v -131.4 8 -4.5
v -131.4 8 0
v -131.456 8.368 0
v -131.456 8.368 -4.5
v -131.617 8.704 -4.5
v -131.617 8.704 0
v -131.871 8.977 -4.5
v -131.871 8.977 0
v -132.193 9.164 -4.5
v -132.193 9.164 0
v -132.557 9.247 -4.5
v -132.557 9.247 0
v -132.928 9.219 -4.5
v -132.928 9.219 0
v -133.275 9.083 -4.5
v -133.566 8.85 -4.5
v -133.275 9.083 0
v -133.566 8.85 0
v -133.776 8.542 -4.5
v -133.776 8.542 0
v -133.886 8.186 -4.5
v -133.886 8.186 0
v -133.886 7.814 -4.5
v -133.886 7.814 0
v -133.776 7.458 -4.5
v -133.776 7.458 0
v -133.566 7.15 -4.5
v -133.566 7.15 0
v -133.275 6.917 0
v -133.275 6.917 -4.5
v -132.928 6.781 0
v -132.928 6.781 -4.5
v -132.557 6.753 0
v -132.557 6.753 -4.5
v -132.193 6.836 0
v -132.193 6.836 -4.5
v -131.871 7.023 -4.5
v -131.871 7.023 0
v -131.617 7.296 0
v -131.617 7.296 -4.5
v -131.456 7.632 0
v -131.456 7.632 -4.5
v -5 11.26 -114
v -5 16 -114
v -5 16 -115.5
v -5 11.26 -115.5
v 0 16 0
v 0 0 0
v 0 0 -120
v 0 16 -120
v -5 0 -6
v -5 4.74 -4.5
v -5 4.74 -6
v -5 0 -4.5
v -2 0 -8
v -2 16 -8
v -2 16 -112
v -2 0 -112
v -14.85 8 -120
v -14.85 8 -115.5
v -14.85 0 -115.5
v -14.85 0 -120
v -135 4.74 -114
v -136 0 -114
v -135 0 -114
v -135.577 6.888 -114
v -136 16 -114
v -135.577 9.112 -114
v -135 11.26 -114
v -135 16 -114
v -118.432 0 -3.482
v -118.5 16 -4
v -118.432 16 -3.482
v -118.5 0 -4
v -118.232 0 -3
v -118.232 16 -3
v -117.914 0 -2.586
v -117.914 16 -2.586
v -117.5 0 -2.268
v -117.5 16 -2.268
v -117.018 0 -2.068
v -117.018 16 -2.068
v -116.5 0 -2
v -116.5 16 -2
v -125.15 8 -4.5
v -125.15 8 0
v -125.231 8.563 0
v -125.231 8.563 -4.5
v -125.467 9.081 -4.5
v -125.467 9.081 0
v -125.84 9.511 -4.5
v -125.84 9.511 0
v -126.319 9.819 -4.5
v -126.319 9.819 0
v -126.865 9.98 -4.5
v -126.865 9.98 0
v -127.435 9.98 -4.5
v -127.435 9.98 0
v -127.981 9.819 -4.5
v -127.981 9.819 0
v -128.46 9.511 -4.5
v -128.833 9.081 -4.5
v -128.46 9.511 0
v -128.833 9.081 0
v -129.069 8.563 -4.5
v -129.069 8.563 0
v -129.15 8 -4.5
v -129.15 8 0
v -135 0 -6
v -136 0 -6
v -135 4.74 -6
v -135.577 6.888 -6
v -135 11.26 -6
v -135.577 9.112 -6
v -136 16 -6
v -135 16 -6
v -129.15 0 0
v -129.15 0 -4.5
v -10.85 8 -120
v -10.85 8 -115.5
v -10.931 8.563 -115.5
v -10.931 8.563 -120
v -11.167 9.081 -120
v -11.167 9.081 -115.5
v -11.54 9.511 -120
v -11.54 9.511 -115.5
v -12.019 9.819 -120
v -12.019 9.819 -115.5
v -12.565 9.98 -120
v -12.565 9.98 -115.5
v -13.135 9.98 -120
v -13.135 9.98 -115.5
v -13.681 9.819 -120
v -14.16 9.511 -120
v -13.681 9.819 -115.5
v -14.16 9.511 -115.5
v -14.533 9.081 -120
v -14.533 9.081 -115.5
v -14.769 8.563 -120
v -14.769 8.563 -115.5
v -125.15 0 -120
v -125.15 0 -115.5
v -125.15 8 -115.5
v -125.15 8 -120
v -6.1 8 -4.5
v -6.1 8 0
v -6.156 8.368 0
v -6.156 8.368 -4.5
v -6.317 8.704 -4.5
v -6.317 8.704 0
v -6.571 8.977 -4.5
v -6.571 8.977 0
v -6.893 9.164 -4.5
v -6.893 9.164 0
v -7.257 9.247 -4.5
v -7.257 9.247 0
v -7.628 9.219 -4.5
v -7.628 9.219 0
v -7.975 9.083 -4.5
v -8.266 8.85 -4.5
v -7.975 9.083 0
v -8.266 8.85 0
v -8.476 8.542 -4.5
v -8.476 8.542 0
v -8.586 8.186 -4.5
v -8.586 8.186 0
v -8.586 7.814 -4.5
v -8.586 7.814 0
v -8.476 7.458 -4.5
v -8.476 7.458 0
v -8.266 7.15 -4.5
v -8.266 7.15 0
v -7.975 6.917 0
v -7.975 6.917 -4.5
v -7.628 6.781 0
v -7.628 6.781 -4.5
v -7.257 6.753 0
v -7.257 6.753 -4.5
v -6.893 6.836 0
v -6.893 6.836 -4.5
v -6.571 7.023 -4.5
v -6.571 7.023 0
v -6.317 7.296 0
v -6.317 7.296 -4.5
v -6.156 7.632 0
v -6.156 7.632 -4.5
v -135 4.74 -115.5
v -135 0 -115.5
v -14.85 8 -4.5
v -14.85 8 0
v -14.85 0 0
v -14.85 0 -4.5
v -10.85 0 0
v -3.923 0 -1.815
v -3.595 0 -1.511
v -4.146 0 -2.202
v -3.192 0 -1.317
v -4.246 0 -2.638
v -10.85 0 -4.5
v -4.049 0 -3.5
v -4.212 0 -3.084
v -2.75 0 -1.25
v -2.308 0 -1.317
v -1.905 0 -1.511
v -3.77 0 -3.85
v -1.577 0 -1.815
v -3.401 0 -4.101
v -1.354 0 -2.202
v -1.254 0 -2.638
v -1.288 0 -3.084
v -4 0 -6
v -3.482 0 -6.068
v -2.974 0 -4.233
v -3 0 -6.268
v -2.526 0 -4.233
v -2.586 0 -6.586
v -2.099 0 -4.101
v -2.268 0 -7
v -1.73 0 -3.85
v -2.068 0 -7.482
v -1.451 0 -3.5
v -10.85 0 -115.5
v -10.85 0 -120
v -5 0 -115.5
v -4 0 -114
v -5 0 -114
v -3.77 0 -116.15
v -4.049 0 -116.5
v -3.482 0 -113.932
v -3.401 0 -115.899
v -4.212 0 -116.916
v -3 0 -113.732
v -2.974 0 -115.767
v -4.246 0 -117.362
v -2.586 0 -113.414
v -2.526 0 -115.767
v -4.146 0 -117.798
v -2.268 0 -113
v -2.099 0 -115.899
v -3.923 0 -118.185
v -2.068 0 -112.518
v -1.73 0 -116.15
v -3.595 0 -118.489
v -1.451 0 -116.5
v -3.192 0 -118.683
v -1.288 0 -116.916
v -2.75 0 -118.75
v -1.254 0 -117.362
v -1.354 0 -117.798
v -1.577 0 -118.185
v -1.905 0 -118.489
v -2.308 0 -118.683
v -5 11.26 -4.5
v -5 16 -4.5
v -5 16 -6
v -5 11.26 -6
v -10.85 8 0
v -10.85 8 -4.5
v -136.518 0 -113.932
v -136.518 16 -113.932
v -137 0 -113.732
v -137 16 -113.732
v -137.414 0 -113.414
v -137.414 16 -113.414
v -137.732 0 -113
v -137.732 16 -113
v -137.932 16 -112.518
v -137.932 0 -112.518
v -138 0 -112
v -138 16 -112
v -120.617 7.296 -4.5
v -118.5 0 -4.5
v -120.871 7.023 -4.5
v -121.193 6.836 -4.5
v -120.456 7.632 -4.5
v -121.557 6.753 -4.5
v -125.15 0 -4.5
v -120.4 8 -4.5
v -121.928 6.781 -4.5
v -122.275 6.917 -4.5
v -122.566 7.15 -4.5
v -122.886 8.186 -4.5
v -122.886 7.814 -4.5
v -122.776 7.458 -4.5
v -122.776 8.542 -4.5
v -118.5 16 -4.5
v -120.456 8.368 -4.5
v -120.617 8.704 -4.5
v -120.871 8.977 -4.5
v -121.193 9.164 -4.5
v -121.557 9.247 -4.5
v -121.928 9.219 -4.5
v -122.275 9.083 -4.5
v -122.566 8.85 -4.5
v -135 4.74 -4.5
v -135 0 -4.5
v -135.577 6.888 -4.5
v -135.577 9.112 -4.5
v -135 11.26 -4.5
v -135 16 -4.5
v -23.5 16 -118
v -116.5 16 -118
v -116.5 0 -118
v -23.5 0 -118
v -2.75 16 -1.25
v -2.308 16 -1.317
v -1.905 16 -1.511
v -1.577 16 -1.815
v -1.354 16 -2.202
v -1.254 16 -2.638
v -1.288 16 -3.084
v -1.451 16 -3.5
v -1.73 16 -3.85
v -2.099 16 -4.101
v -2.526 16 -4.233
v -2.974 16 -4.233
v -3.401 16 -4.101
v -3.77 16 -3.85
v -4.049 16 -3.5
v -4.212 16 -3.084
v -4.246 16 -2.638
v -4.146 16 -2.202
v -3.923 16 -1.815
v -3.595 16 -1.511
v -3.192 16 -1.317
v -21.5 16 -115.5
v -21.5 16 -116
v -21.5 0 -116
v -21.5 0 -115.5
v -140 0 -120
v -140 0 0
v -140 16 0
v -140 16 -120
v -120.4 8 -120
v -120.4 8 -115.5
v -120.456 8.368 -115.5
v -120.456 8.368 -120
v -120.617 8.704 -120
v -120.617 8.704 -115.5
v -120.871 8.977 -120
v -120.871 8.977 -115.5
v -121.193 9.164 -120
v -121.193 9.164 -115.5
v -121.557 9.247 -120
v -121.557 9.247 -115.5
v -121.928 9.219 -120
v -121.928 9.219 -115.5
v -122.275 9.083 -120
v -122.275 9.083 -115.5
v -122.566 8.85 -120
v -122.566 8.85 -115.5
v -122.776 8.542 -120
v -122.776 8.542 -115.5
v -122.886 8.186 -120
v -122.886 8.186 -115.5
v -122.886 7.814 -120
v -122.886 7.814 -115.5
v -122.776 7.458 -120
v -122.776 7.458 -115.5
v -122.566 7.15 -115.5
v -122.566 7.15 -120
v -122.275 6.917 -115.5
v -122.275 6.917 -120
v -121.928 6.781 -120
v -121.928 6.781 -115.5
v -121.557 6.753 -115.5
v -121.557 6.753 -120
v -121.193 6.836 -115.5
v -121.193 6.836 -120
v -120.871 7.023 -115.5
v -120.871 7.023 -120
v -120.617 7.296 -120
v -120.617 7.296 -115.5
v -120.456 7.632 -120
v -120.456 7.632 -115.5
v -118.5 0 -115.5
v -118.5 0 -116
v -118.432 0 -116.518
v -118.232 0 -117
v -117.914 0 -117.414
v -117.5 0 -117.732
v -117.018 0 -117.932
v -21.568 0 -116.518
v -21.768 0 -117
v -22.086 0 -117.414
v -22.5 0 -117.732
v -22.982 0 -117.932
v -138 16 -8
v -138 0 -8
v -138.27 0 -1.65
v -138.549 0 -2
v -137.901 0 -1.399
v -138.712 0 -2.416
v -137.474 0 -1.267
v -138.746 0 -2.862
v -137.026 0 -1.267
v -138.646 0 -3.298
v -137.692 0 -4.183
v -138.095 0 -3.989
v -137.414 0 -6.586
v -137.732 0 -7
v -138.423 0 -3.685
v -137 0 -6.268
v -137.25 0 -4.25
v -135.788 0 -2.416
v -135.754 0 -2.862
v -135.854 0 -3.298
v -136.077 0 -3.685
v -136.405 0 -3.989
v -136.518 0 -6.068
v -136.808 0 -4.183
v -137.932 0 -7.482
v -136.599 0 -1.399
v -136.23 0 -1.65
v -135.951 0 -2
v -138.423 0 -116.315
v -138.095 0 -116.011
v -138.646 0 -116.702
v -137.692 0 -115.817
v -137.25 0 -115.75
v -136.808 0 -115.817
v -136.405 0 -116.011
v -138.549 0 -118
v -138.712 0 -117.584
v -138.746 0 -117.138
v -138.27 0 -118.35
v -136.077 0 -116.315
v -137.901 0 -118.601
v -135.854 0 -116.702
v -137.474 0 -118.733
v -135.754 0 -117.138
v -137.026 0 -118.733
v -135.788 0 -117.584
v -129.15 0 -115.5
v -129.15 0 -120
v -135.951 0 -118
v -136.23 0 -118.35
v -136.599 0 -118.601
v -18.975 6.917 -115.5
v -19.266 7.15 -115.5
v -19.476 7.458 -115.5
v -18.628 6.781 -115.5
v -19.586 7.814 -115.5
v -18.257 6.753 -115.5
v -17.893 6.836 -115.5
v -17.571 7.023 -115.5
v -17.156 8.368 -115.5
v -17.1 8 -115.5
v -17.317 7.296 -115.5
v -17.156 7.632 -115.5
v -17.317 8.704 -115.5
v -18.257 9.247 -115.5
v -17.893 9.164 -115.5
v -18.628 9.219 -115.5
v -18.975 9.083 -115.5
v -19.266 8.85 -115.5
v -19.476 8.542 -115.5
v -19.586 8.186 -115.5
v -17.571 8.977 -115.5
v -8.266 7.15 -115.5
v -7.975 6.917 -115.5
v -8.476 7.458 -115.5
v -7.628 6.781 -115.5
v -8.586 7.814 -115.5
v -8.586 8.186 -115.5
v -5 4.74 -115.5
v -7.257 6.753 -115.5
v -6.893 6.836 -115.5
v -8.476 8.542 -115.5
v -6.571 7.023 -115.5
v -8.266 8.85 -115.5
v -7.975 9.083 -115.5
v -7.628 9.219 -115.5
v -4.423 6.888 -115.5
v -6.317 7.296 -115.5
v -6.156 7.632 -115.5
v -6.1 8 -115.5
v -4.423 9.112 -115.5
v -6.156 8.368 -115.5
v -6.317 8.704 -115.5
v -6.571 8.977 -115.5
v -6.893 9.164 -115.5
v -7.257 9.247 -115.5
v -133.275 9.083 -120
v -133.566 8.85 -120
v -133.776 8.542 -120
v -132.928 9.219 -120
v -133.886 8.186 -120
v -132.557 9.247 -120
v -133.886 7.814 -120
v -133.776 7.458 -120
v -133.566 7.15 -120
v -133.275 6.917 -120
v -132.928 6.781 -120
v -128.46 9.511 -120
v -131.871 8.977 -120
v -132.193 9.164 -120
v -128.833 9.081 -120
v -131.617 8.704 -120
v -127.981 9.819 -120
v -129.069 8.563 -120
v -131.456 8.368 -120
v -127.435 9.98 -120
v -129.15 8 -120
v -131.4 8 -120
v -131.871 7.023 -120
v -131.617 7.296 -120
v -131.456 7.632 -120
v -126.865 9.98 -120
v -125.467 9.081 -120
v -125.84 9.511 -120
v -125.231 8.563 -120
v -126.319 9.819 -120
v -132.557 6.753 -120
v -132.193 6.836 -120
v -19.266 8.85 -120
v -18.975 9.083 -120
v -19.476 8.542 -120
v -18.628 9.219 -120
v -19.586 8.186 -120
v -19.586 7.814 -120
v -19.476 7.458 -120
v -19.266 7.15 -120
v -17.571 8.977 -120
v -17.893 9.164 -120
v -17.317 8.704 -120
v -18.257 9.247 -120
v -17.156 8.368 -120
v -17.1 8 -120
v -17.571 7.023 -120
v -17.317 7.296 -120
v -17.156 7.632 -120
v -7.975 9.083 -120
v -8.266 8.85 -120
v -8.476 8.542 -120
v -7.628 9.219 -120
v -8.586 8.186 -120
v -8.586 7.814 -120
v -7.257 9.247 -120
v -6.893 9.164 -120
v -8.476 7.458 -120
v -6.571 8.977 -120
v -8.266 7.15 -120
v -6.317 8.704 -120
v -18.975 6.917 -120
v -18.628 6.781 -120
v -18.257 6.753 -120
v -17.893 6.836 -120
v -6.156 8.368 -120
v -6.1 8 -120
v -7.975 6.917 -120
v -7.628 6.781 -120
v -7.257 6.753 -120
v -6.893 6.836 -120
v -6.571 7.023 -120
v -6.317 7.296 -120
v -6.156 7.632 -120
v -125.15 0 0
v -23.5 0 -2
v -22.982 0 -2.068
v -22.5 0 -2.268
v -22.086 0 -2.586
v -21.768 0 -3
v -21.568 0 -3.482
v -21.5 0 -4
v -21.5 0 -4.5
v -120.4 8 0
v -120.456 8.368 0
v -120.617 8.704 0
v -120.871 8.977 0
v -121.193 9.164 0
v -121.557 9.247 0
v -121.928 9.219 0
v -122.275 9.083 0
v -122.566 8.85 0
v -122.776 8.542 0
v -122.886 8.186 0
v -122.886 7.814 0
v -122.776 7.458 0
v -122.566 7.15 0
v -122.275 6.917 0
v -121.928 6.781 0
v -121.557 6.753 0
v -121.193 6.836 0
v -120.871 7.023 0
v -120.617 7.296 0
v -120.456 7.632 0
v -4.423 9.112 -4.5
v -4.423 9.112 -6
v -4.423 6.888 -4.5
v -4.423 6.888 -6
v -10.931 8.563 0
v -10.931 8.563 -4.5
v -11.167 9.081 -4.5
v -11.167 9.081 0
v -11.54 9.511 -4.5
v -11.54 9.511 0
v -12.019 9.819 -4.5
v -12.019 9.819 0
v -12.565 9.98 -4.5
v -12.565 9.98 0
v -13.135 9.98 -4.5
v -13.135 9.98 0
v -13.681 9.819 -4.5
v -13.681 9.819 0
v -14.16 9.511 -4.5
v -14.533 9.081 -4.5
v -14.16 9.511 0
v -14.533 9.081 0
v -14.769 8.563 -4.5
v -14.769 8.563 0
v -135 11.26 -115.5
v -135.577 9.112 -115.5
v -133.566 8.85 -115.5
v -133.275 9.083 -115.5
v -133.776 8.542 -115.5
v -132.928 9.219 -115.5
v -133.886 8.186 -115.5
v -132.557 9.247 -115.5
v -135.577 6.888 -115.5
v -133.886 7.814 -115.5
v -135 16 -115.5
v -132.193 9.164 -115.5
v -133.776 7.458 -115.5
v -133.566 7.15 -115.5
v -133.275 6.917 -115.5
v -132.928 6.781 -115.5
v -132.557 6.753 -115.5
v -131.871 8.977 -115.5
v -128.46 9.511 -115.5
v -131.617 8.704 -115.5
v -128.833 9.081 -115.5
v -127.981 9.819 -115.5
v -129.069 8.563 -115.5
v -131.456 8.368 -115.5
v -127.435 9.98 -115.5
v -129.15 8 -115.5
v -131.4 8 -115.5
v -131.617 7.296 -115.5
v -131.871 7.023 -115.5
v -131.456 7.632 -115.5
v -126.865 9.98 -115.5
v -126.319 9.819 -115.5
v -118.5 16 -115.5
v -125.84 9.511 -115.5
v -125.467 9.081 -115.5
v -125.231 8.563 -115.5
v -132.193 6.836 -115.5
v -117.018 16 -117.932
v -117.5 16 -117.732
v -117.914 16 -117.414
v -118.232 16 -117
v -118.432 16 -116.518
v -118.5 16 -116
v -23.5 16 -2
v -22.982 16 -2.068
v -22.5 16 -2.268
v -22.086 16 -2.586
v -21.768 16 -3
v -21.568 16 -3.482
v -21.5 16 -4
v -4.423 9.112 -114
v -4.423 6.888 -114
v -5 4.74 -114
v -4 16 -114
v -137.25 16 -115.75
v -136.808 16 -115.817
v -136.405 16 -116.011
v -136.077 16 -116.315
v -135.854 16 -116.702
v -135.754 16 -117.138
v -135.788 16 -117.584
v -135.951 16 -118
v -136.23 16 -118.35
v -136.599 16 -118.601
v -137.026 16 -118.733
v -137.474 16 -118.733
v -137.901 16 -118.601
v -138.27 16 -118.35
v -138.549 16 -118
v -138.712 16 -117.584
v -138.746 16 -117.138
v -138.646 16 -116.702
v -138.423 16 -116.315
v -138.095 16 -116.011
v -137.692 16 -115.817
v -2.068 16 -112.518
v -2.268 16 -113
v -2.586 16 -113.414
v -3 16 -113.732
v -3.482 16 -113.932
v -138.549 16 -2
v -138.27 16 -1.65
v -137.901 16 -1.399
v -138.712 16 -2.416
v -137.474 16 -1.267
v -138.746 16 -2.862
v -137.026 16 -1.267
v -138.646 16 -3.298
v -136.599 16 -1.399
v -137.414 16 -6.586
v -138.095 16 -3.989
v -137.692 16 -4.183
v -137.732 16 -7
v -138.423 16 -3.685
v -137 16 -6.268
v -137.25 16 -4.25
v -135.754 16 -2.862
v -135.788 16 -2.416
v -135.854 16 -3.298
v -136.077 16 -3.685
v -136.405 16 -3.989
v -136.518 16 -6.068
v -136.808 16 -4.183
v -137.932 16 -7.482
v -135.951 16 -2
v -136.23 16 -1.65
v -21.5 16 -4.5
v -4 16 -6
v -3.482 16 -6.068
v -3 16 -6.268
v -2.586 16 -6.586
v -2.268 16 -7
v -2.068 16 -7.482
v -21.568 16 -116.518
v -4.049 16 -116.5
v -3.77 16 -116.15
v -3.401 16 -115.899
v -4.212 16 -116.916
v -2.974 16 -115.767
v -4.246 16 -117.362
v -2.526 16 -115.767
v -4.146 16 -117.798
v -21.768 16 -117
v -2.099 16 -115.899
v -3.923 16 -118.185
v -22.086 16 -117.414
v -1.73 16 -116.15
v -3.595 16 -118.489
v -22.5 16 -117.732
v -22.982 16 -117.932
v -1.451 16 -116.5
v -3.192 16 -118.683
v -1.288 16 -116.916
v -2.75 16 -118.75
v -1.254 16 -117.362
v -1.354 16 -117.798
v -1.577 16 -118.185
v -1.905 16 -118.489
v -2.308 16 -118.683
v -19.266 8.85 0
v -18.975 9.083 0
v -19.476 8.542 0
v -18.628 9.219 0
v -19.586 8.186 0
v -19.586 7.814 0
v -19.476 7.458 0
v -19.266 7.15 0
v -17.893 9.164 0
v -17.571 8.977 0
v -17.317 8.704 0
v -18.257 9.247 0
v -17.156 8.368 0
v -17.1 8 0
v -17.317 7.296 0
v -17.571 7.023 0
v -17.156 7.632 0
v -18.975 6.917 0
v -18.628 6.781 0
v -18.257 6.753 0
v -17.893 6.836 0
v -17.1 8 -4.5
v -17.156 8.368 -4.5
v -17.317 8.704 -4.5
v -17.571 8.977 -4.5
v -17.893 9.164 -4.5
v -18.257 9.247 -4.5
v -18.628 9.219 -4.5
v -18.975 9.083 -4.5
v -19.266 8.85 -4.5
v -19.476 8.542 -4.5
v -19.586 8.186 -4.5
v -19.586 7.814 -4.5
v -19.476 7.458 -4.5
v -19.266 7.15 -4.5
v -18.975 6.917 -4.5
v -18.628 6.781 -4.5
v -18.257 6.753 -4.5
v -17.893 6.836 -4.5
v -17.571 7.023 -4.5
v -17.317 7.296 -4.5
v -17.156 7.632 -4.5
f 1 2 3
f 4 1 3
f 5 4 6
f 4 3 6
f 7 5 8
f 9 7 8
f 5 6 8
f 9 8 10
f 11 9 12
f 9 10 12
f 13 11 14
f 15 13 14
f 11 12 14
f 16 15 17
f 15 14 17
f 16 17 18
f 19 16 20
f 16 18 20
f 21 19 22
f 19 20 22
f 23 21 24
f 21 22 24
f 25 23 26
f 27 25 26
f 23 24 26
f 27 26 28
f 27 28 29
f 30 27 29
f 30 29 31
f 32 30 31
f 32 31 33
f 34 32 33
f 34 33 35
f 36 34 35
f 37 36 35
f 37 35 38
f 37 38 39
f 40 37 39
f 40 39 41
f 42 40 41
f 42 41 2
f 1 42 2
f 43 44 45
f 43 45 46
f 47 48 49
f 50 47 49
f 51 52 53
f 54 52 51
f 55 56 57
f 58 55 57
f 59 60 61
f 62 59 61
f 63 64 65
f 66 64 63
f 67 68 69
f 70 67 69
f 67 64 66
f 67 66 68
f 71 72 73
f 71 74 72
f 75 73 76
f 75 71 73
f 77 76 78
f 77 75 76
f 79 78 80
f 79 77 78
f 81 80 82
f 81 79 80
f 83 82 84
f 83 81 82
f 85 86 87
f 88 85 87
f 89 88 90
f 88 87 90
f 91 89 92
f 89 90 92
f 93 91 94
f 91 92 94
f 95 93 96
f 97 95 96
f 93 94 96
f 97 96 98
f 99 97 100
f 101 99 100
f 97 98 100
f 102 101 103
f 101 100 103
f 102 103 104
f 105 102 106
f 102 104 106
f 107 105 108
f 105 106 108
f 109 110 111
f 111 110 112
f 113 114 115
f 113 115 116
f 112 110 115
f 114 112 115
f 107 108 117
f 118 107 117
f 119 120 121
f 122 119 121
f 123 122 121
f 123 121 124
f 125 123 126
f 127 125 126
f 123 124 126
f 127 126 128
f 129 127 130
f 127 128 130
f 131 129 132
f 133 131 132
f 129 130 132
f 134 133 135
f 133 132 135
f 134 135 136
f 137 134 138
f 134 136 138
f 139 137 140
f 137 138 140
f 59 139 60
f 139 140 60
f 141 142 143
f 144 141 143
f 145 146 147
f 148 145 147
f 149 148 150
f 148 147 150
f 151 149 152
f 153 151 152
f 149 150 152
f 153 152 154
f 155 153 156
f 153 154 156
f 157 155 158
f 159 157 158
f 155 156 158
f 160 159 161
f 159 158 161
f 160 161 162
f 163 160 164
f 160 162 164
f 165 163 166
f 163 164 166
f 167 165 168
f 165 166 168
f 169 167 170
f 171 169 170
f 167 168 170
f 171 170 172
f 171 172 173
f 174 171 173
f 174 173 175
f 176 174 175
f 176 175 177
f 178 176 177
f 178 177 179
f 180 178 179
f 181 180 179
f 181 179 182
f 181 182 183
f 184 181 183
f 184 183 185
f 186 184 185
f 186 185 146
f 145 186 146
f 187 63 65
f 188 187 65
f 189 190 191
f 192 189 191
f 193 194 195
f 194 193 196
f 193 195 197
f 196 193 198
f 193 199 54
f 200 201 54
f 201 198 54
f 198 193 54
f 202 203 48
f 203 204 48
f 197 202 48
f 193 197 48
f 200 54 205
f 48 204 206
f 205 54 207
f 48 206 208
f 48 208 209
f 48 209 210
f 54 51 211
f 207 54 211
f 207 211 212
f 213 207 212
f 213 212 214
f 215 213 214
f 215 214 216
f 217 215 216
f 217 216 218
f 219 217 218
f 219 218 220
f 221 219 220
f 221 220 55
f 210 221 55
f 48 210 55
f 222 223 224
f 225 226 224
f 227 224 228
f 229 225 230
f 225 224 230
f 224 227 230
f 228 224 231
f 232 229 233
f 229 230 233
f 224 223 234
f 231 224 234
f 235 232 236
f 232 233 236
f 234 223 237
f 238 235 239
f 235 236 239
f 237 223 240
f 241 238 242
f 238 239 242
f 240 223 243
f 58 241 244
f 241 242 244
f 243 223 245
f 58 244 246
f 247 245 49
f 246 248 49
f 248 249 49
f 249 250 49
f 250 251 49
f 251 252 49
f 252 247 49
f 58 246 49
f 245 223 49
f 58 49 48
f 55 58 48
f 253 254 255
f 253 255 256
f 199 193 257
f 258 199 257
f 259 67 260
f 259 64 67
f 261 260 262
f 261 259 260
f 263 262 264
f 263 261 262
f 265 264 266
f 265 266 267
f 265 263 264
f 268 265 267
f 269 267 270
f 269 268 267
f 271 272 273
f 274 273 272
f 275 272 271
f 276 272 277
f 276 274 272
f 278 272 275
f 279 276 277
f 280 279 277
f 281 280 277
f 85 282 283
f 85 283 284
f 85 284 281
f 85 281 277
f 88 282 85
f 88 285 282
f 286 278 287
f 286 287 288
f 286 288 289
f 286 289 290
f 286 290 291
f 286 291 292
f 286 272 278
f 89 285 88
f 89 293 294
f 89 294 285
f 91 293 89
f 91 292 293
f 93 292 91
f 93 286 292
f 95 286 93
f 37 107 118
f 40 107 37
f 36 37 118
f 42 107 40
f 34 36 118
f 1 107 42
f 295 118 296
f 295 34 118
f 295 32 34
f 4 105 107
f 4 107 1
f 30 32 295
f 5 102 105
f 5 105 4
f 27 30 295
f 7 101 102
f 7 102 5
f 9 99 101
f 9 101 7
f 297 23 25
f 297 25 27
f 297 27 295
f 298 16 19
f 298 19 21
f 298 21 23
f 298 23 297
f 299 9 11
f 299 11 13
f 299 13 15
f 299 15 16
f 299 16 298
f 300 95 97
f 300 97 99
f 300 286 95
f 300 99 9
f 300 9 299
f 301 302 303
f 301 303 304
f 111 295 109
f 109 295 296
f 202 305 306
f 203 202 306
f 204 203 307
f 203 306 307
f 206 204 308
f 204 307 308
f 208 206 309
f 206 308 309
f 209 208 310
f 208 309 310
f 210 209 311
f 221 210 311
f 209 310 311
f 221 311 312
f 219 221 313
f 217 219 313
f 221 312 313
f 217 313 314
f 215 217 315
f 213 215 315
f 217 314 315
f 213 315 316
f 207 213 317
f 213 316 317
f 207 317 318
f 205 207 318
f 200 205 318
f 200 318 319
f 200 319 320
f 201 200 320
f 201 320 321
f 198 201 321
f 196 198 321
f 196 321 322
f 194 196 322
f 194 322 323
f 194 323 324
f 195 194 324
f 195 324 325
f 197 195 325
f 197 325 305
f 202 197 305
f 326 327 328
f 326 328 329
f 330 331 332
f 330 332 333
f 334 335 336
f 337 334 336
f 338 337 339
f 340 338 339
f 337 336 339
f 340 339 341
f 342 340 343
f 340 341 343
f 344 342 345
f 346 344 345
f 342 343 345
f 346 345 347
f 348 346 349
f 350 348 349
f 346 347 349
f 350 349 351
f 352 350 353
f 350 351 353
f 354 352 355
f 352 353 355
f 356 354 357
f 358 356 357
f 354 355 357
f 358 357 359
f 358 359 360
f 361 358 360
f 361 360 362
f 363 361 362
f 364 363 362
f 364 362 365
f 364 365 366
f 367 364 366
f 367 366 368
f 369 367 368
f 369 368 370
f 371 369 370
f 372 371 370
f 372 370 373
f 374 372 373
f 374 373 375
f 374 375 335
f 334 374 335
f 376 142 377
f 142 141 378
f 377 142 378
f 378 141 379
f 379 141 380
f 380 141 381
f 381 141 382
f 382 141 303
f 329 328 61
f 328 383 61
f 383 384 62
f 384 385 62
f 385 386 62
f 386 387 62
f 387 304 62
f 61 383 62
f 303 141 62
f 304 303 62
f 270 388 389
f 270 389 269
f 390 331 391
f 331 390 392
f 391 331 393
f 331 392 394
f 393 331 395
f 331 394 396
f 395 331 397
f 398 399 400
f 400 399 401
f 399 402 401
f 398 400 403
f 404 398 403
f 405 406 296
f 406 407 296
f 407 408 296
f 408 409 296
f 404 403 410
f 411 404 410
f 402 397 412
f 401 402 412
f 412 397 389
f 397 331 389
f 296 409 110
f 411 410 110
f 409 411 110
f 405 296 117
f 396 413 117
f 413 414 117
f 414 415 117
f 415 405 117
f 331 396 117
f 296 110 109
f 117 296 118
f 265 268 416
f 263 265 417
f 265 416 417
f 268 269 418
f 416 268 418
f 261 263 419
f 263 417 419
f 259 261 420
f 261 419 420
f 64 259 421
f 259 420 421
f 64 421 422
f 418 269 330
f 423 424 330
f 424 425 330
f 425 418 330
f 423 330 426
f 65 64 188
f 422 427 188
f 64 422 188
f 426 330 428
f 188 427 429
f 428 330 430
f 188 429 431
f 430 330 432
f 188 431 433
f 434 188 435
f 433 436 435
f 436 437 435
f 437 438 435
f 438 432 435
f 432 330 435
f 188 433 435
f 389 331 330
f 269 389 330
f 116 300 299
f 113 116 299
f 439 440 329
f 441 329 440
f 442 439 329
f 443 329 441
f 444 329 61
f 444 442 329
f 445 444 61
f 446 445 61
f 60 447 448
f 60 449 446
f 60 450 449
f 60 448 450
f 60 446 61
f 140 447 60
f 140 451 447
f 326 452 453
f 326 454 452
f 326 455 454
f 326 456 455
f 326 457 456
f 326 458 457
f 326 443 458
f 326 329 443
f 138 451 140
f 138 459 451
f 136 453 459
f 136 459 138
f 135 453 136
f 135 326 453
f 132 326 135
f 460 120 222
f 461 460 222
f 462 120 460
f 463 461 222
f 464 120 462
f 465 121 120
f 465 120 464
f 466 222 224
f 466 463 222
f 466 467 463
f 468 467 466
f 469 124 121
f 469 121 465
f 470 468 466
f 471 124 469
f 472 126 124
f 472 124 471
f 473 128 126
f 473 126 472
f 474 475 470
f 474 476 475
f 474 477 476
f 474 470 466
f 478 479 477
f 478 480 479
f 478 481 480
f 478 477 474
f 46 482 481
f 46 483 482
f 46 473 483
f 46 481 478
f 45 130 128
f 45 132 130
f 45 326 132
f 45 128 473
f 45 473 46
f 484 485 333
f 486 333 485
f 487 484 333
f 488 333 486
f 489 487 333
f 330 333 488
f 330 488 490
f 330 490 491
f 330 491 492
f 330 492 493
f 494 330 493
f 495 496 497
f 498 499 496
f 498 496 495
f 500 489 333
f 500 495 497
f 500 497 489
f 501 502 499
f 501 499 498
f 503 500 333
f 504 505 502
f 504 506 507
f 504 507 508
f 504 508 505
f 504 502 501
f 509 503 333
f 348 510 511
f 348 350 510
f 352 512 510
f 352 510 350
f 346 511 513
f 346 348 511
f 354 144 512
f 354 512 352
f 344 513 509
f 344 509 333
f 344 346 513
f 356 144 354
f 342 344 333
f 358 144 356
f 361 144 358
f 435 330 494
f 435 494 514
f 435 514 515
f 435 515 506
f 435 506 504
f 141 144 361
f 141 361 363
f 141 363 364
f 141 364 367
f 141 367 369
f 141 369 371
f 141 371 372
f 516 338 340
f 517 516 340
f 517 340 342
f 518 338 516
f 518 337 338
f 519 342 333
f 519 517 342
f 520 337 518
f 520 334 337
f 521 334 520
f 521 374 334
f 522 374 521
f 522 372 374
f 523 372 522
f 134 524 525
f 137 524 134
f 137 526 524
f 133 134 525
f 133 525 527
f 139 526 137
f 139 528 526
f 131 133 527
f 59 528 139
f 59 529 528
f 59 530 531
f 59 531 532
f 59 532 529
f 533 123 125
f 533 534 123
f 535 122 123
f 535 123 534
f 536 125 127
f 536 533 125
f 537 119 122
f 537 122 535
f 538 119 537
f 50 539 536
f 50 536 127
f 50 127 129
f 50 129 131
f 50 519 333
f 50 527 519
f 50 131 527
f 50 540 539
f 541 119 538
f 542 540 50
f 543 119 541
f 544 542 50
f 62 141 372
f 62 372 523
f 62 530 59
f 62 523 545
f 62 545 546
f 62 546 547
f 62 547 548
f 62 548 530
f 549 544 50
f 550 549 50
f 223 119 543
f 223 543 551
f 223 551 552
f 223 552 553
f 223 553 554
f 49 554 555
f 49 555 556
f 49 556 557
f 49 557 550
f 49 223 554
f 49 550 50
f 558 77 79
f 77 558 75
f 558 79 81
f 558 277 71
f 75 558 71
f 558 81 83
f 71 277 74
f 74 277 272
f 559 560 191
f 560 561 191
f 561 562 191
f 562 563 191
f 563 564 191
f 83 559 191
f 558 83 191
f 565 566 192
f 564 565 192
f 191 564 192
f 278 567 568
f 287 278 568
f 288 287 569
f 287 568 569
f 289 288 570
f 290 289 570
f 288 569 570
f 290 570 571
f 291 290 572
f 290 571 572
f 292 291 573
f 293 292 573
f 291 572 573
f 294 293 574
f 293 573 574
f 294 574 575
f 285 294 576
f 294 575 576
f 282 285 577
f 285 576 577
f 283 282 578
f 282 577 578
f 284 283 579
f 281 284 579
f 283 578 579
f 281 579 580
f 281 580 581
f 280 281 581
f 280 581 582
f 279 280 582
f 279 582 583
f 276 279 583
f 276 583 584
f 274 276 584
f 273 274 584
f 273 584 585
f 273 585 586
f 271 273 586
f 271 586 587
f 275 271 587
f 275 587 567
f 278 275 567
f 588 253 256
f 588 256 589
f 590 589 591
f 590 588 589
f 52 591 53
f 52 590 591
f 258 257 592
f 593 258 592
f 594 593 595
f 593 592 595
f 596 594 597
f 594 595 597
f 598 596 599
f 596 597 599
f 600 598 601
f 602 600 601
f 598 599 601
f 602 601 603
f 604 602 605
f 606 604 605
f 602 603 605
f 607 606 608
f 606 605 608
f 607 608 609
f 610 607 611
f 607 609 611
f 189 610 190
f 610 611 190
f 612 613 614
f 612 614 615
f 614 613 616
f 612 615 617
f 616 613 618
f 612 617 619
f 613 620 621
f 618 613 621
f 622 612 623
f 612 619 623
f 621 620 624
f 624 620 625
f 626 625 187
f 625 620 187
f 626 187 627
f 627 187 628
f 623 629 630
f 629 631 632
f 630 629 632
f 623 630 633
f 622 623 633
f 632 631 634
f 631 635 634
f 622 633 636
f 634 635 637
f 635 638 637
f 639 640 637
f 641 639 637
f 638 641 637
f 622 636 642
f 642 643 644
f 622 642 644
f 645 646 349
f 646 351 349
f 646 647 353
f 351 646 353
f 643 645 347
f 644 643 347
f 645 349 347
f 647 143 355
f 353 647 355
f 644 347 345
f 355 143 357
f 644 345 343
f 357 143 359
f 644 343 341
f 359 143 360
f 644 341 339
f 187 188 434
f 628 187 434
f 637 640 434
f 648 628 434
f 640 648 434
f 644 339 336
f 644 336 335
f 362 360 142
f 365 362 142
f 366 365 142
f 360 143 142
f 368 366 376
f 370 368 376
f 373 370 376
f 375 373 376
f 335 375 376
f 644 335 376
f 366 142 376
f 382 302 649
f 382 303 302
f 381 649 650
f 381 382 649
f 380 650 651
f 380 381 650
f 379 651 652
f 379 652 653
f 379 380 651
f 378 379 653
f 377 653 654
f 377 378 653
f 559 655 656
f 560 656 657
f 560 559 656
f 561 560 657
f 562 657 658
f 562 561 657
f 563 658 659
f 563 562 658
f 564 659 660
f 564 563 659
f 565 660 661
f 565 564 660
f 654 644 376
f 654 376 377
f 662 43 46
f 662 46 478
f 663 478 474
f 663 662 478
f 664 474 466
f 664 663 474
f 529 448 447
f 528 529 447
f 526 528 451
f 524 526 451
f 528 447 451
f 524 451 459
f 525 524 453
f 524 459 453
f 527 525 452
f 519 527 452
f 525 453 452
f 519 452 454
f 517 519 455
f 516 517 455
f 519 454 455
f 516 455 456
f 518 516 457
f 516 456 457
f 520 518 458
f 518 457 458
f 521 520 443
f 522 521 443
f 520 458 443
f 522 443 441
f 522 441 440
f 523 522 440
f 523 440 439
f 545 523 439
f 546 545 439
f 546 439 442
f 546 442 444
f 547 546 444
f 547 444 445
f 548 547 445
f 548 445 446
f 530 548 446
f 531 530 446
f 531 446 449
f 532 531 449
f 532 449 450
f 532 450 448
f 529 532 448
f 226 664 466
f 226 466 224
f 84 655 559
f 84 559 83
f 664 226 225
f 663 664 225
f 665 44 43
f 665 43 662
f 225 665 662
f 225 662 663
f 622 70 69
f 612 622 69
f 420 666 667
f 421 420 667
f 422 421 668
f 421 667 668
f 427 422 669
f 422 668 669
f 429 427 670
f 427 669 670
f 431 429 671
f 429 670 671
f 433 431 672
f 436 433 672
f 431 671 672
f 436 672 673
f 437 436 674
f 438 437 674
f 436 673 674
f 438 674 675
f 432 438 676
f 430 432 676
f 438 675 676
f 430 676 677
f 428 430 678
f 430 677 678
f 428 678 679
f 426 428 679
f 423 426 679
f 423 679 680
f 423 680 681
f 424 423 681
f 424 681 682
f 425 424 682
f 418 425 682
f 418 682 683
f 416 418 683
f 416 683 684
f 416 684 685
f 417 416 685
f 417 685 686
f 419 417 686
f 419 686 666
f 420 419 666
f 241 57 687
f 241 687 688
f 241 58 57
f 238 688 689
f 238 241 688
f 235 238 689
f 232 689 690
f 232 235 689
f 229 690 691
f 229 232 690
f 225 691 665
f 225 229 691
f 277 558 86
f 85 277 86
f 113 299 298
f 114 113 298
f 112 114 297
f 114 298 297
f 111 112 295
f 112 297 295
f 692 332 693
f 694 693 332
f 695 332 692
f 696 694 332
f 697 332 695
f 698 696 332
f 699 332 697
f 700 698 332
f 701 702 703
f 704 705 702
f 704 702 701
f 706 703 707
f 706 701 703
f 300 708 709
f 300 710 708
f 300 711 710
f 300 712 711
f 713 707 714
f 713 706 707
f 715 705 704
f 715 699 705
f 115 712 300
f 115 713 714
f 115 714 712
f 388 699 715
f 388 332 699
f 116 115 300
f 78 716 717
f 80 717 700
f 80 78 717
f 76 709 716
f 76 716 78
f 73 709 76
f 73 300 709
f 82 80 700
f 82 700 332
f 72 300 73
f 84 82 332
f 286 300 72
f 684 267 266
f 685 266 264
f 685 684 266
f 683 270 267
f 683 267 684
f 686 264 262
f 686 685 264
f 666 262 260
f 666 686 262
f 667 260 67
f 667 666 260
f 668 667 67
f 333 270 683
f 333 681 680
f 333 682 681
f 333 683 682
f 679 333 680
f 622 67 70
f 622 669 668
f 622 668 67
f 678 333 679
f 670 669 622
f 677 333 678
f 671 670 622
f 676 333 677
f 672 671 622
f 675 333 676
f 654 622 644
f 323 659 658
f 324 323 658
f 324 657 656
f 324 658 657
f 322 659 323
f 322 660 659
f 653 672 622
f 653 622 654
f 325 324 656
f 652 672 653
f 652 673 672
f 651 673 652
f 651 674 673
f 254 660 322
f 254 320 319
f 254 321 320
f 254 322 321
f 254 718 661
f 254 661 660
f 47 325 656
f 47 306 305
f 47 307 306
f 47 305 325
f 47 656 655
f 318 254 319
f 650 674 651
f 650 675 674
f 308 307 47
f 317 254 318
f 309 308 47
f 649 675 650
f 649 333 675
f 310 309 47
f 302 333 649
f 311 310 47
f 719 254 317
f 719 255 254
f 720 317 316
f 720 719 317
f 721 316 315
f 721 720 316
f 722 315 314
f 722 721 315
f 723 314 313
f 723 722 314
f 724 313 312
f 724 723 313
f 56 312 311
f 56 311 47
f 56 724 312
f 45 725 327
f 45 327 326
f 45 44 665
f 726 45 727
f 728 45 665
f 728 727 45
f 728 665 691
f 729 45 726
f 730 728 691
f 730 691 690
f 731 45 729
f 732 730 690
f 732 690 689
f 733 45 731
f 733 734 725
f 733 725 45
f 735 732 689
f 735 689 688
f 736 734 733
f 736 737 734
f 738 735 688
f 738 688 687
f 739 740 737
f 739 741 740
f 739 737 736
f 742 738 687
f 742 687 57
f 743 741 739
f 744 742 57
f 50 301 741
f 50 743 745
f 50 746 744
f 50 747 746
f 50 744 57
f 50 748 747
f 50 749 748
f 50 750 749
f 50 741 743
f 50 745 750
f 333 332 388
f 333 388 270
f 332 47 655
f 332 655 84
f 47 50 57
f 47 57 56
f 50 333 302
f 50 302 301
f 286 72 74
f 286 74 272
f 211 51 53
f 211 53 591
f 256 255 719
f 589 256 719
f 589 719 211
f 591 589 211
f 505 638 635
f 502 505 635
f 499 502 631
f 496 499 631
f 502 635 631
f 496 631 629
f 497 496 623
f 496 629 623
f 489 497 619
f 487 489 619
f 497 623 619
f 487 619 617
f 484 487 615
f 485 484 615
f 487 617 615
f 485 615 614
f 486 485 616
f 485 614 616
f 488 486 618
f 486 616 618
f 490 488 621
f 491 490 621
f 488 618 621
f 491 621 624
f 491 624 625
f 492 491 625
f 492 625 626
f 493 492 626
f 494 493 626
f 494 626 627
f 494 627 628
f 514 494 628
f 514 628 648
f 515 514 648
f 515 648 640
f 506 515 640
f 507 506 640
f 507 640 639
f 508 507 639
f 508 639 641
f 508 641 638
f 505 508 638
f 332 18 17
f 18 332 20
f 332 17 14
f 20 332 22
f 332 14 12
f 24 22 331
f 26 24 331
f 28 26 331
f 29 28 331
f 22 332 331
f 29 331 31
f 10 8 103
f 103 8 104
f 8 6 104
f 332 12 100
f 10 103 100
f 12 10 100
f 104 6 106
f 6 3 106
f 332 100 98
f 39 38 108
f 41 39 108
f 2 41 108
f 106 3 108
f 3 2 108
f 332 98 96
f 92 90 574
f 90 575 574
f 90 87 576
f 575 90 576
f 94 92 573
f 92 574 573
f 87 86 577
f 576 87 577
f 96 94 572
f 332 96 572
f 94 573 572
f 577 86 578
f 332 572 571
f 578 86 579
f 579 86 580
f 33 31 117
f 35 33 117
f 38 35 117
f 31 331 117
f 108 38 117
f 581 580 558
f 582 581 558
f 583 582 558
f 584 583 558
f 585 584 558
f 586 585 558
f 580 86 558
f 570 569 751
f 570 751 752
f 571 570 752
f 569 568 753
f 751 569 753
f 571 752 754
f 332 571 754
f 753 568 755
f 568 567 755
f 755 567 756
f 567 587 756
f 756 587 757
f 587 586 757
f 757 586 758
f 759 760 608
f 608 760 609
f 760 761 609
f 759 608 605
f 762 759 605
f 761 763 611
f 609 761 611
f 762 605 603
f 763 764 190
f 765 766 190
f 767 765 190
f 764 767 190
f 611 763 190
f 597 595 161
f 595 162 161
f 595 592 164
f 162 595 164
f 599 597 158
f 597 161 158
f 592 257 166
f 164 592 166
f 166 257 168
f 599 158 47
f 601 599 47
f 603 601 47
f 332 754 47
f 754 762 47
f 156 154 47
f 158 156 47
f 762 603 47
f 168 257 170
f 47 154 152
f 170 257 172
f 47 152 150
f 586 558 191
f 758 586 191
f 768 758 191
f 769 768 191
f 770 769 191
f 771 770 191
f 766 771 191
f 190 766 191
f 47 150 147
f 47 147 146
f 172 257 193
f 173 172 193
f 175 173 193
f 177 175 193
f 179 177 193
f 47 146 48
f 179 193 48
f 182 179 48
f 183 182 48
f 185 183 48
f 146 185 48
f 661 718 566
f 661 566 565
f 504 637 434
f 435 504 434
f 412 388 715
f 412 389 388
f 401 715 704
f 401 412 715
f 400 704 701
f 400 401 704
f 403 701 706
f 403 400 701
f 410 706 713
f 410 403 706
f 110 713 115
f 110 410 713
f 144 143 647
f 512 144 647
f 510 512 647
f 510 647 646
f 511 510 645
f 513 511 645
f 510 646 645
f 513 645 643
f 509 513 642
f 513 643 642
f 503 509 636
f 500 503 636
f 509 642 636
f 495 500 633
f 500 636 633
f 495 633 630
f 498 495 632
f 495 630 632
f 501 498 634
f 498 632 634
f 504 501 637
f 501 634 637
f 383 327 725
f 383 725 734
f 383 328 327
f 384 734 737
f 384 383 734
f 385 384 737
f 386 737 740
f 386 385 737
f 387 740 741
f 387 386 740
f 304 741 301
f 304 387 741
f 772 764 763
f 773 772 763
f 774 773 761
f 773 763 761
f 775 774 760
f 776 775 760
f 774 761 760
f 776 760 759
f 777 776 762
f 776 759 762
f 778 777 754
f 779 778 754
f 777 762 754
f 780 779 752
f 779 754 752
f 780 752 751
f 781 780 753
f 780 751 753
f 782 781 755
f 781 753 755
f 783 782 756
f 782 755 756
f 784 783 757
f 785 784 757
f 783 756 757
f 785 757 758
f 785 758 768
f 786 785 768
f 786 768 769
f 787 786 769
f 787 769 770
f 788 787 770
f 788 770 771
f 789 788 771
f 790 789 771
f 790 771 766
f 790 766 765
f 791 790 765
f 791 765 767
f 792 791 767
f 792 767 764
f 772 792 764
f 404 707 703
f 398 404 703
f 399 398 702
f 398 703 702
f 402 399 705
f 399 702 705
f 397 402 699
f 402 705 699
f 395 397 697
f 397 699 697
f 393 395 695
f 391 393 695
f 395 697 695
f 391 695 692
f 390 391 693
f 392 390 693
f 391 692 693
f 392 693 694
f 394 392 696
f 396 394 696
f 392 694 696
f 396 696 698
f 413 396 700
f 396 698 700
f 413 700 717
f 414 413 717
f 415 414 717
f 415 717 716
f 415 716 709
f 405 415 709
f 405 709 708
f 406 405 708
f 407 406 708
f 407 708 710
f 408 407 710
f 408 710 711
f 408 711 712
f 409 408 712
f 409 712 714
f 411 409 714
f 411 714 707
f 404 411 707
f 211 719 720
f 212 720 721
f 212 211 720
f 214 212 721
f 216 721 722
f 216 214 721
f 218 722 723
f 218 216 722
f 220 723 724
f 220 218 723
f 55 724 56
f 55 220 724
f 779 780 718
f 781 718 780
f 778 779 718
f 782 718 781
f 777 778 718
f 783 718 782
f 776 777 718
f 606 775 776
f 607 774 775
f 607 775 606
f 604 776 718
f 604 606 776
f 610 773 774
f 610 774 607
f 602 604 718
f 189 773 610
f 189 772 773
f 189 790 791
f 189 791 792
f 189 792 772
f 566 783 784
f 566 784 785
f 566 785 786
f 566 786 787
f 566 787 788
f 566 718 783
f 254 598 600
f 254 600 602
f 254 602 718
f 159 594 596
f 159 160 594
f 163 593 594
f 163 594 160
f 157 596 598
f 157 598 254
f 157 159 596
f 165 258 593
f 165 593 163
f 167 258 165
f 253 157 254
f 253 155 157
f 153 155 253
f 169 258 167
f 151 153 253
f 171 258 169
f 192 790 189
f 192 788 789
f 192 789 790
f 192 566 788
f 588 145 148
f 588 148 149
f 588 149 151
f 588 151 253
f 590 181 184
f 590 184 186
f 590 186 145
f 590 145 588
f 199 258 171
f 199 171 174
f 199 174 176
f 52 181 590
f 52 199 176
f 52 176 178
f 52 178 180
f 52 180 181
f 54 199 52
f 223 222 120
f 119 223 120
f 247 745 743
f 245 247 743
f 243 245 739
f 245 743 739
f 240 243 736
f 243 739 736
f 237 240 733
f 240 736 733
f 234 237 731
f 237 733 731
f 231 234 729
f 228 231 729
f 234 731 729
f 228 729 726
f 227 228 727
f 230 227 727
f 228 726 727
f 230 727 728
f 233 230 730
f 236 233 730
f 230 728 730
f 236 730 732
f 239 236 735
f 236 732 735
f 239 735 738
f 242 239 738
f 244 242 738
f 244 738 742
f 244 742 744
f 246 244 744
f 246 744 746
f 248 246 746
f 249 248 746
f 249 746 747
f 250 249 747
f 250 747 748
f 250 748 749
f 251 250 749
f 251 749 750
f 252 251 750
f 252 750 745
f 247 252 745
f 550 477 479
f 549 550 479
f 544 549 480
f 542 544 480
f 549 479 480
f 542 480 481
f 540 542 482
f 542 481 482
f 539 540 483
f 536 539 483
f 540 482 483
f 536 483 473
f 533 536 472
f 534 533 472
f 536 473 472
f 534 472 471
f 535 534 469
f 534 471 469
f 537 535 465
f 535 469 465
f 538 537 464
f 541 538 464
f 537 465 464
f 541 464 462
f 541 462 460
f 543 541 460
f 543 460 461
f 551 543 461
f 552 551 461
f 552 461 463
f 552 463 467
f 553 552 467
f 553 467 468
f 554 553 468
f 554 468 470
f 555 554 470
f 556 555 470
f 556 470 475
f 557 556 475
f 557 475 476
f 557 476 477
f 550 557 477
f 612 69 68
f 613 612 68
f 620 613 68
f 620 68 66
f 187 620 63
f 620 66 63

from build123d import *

# Parameters (mm, degrees)
SKETCH1_W           = 140
SKETCH1_H           = 120
SKETCH1_W_2         = 131
SKETCH1_H_2         = 111
BOSS_EXTRUDE1_DEPTH = 16
CUT_EXTRUDE1_DEPTH  = 186.08376482
SKETCH5_R           = 1.25
CUT_EXTRUDE3_DEPTH  = 186.08376482
CUT_EXTRUDE2_DEPTH  = 186.08376482
BOSS_EXTRUDE2_DEPTH = 115.5
SKETCH7_W           = 136
SKETCH7_H           = 108
CUT_EXTRUDE4_DEPTH  = 186.08376482
FILLET1_R           = 2
SKETCH9_R           = 1.3
CUT_EXTRUDE5_DEPTH  = 4
SKETCH10_R          = 1.5
CUT_EXTRUDE6_DEPTH  = 186.08376482


with BuildPart() as part:
    # Sketch1 → Boss-Extrude1 (new body)
    with BuildSketch(Plane(origin=(0, 0, 0), x_dir=(1, 0, 0), z_dir=(0, 1, 0))):
        with Locations((-70, 60)):
            Rectangle(SKETCH1_W, SKETCH1_H)
        with Locations((-70, 60)):
            Rectangle(SKETCH1_W_2, SKETCH1_H_2, mode=Mode.SUBTRACT)
    extrude(amount=BOSS_EXTRUDE1_DEPTH)

    # Sketch3 → Cut-Extrude1 (cut, through all)
    with BuildSketch(Plane.XY):
        with BuildLine():
            Line((-129.15, 8), (-129.15, 0))
            Line((-129.15, 0), (-125.15, 0))
            Line((-125.15, 0), (-125.15, 8))
            ThreePointArc((-125.15, 8), (-127.15, 10), (-129.15, 8))
        make_face()
        with BuildLine():
            Line((-14.85, 8), (-14.85, 0))
            Line((-14.85, 0), (-10.85, 0))
            Line((-10.85, 0), (-10.85, 8))
            ThreePointArc((-10.85, 8), (-12.85, 10), (-14.85, 8))
        make_face()
    extrude(amount=-CUT_EXTRUDE1_DEPTH, mode=Mode.SUBTRACT)

    # Sketch5 → Cut-Extrude3 (cut, through all)
    with BuildSketch(Plane.XY):
        with Locations((-132.65, 8)):
            Circle(SKETCH5_R)
        with Locations((-121.65, 8)):
            Circle(SKETCH5_R)
        with Locations((-18.35, 8)):
            Circle(SKETCH5_R)
        with Locations((-7.35, 8)):
            Circle(SKETCH5_R)
    extrude(amount=-CUT_EXTRUDE3_DEPTH, mode=Mode.SUBTRACT)

    # Sketch4 → Cut-Extrude2 (cut, through all)
    with BuildSketch(Plane(origin=(0, 16, 0), x_dir=(1, 0, 0), z_dir=(0, 1, 0))):
        Polygon((-138, 115.5), (-118.5, 115.5), (-118.5, 118), (-21.5, 118), (-21.5, 115.5), (-2, 115.5), (-2, 4.5), (-21.5, 4.5), (-21.5, 2), (-118.5, 2), (-118.5, 4.5), (-138, 4.5), align=None)
    extrude(amount=-CUT_EXTRUDE2_DEPTH, mode=Mode.SUBTRACT)

    # Sketch6 → Boss-Extrude2 (add)
    with BuildSketch(Plane.XY):
        with BuildLine():
            Line((-140, 16), (-135, 16))
            Line((-135, 16), (-135, 11.259984663))
            ThreePointArc((-135, 11.259984663), (-135.65, 8), (-135, 4.740015337))
            Line((-135, 4.740015337), (-135, 0))
            Line((-135, 0), (-140, 0))
            Line((-140, 0), (-140, 16))
        make_face()
        with BuildLine():
            Line((-5, 16), (-5, 11.259984663))
            ThreePointArc((-5, 11.259984663), (-4.35, 8), (-5, 4.740015337))
            Line((-5, 4.740015337), (-5, 0))
            Line((-5, 0), (0, 0))
            Line((0, 0), (0, 16))
            Line((0, 16), (-5, 16))
        make_face()
    extrude(amount=-BOSS_EXTRUDE2_DEPTH)

    # Sketch7 → Cut-Extrude4 (cut, through all)
    with BuildSketch(Plane(origin=(0, 16, 0), x_dir=(1, 0, 0), z_dir=(0, 1, 0))):
        with Locations((-70, 60)):
            Rectangle(SKETCH7_W, SKETCH7_H)
    extrude(amount=-CUT_EXTRUDE4_DEPTH, mode=Mode.SUBTRACT)

    # Fillet1
    fillet1_edges = [part.edges().sort_by_distance(p)[0] for p in [
        (-118.5, 8, -118),
        (-21.5, 8, -118),
        (-21.5, 8, -2),
        (-118.5, 8, -2),
        (-2, 8, -6),
        (-138, 8, -6),
        (-138, 8, -114),
        (-2, 8, -114),
    ]]
    fillet(fillet1_edges, radius=FILLET1_R)

    # Sketch9 → Cut-Extrude5 (cut)
    with BuildSketch(Plane(origin=(0, 0, 0), x_dir=(1, 0, 0), z_dir=(0, 1, 0))):
        with Locations(Location((-137.25, 2.75, 0), (0, 0, 270))):
            Circle(SKETCH9_R)
        with Locations(Location((-2.75, 2.75, 0), (0, 0, 90))):
            Circle(SKETCH9_R)
        with Locations(Location((-2.75, 117.25, 0), (0, 0, 270))):
            Circle(SKETCH9_R)
        with Locations(Location((-137.25, 117.25, 0), (0, 0, 90))):
            Circle(SKETCH9_R)
    extrude(amount=CUT_EXTRUDE5_DEPTH, mode=Mode.SUBTRACT)

    # Sketch10 → Cut-Extrude6 (cut, through all)
    with BuildSketch(Plane(origin=(0, 16, 0), x_dir=(1, 0, 0), z_dir=(0, 1, 0))):
        with Locations(Location((-137.25, 117.25, 0), (0, 0, 270))):
            Circle(SKETCH10_R)
        with Locations(Location((-2.75, 117.25, 0), (0, 0, 90))):
            Circle(SKETCH10_R)
        with Locations(Location((-2.75, 2.75, 0), (0, 0, 270))):
            Circle(SKETCH10_R)
        with Locations(Location((-137.25, 2.75, 0), (0, 0, 90))):
            Circle(SKETCH10_R)
    extrude(amount=-CUT_EXTRUDE6_DEPTH, mode=Mode.SUBTRACT)


solid = part.part
